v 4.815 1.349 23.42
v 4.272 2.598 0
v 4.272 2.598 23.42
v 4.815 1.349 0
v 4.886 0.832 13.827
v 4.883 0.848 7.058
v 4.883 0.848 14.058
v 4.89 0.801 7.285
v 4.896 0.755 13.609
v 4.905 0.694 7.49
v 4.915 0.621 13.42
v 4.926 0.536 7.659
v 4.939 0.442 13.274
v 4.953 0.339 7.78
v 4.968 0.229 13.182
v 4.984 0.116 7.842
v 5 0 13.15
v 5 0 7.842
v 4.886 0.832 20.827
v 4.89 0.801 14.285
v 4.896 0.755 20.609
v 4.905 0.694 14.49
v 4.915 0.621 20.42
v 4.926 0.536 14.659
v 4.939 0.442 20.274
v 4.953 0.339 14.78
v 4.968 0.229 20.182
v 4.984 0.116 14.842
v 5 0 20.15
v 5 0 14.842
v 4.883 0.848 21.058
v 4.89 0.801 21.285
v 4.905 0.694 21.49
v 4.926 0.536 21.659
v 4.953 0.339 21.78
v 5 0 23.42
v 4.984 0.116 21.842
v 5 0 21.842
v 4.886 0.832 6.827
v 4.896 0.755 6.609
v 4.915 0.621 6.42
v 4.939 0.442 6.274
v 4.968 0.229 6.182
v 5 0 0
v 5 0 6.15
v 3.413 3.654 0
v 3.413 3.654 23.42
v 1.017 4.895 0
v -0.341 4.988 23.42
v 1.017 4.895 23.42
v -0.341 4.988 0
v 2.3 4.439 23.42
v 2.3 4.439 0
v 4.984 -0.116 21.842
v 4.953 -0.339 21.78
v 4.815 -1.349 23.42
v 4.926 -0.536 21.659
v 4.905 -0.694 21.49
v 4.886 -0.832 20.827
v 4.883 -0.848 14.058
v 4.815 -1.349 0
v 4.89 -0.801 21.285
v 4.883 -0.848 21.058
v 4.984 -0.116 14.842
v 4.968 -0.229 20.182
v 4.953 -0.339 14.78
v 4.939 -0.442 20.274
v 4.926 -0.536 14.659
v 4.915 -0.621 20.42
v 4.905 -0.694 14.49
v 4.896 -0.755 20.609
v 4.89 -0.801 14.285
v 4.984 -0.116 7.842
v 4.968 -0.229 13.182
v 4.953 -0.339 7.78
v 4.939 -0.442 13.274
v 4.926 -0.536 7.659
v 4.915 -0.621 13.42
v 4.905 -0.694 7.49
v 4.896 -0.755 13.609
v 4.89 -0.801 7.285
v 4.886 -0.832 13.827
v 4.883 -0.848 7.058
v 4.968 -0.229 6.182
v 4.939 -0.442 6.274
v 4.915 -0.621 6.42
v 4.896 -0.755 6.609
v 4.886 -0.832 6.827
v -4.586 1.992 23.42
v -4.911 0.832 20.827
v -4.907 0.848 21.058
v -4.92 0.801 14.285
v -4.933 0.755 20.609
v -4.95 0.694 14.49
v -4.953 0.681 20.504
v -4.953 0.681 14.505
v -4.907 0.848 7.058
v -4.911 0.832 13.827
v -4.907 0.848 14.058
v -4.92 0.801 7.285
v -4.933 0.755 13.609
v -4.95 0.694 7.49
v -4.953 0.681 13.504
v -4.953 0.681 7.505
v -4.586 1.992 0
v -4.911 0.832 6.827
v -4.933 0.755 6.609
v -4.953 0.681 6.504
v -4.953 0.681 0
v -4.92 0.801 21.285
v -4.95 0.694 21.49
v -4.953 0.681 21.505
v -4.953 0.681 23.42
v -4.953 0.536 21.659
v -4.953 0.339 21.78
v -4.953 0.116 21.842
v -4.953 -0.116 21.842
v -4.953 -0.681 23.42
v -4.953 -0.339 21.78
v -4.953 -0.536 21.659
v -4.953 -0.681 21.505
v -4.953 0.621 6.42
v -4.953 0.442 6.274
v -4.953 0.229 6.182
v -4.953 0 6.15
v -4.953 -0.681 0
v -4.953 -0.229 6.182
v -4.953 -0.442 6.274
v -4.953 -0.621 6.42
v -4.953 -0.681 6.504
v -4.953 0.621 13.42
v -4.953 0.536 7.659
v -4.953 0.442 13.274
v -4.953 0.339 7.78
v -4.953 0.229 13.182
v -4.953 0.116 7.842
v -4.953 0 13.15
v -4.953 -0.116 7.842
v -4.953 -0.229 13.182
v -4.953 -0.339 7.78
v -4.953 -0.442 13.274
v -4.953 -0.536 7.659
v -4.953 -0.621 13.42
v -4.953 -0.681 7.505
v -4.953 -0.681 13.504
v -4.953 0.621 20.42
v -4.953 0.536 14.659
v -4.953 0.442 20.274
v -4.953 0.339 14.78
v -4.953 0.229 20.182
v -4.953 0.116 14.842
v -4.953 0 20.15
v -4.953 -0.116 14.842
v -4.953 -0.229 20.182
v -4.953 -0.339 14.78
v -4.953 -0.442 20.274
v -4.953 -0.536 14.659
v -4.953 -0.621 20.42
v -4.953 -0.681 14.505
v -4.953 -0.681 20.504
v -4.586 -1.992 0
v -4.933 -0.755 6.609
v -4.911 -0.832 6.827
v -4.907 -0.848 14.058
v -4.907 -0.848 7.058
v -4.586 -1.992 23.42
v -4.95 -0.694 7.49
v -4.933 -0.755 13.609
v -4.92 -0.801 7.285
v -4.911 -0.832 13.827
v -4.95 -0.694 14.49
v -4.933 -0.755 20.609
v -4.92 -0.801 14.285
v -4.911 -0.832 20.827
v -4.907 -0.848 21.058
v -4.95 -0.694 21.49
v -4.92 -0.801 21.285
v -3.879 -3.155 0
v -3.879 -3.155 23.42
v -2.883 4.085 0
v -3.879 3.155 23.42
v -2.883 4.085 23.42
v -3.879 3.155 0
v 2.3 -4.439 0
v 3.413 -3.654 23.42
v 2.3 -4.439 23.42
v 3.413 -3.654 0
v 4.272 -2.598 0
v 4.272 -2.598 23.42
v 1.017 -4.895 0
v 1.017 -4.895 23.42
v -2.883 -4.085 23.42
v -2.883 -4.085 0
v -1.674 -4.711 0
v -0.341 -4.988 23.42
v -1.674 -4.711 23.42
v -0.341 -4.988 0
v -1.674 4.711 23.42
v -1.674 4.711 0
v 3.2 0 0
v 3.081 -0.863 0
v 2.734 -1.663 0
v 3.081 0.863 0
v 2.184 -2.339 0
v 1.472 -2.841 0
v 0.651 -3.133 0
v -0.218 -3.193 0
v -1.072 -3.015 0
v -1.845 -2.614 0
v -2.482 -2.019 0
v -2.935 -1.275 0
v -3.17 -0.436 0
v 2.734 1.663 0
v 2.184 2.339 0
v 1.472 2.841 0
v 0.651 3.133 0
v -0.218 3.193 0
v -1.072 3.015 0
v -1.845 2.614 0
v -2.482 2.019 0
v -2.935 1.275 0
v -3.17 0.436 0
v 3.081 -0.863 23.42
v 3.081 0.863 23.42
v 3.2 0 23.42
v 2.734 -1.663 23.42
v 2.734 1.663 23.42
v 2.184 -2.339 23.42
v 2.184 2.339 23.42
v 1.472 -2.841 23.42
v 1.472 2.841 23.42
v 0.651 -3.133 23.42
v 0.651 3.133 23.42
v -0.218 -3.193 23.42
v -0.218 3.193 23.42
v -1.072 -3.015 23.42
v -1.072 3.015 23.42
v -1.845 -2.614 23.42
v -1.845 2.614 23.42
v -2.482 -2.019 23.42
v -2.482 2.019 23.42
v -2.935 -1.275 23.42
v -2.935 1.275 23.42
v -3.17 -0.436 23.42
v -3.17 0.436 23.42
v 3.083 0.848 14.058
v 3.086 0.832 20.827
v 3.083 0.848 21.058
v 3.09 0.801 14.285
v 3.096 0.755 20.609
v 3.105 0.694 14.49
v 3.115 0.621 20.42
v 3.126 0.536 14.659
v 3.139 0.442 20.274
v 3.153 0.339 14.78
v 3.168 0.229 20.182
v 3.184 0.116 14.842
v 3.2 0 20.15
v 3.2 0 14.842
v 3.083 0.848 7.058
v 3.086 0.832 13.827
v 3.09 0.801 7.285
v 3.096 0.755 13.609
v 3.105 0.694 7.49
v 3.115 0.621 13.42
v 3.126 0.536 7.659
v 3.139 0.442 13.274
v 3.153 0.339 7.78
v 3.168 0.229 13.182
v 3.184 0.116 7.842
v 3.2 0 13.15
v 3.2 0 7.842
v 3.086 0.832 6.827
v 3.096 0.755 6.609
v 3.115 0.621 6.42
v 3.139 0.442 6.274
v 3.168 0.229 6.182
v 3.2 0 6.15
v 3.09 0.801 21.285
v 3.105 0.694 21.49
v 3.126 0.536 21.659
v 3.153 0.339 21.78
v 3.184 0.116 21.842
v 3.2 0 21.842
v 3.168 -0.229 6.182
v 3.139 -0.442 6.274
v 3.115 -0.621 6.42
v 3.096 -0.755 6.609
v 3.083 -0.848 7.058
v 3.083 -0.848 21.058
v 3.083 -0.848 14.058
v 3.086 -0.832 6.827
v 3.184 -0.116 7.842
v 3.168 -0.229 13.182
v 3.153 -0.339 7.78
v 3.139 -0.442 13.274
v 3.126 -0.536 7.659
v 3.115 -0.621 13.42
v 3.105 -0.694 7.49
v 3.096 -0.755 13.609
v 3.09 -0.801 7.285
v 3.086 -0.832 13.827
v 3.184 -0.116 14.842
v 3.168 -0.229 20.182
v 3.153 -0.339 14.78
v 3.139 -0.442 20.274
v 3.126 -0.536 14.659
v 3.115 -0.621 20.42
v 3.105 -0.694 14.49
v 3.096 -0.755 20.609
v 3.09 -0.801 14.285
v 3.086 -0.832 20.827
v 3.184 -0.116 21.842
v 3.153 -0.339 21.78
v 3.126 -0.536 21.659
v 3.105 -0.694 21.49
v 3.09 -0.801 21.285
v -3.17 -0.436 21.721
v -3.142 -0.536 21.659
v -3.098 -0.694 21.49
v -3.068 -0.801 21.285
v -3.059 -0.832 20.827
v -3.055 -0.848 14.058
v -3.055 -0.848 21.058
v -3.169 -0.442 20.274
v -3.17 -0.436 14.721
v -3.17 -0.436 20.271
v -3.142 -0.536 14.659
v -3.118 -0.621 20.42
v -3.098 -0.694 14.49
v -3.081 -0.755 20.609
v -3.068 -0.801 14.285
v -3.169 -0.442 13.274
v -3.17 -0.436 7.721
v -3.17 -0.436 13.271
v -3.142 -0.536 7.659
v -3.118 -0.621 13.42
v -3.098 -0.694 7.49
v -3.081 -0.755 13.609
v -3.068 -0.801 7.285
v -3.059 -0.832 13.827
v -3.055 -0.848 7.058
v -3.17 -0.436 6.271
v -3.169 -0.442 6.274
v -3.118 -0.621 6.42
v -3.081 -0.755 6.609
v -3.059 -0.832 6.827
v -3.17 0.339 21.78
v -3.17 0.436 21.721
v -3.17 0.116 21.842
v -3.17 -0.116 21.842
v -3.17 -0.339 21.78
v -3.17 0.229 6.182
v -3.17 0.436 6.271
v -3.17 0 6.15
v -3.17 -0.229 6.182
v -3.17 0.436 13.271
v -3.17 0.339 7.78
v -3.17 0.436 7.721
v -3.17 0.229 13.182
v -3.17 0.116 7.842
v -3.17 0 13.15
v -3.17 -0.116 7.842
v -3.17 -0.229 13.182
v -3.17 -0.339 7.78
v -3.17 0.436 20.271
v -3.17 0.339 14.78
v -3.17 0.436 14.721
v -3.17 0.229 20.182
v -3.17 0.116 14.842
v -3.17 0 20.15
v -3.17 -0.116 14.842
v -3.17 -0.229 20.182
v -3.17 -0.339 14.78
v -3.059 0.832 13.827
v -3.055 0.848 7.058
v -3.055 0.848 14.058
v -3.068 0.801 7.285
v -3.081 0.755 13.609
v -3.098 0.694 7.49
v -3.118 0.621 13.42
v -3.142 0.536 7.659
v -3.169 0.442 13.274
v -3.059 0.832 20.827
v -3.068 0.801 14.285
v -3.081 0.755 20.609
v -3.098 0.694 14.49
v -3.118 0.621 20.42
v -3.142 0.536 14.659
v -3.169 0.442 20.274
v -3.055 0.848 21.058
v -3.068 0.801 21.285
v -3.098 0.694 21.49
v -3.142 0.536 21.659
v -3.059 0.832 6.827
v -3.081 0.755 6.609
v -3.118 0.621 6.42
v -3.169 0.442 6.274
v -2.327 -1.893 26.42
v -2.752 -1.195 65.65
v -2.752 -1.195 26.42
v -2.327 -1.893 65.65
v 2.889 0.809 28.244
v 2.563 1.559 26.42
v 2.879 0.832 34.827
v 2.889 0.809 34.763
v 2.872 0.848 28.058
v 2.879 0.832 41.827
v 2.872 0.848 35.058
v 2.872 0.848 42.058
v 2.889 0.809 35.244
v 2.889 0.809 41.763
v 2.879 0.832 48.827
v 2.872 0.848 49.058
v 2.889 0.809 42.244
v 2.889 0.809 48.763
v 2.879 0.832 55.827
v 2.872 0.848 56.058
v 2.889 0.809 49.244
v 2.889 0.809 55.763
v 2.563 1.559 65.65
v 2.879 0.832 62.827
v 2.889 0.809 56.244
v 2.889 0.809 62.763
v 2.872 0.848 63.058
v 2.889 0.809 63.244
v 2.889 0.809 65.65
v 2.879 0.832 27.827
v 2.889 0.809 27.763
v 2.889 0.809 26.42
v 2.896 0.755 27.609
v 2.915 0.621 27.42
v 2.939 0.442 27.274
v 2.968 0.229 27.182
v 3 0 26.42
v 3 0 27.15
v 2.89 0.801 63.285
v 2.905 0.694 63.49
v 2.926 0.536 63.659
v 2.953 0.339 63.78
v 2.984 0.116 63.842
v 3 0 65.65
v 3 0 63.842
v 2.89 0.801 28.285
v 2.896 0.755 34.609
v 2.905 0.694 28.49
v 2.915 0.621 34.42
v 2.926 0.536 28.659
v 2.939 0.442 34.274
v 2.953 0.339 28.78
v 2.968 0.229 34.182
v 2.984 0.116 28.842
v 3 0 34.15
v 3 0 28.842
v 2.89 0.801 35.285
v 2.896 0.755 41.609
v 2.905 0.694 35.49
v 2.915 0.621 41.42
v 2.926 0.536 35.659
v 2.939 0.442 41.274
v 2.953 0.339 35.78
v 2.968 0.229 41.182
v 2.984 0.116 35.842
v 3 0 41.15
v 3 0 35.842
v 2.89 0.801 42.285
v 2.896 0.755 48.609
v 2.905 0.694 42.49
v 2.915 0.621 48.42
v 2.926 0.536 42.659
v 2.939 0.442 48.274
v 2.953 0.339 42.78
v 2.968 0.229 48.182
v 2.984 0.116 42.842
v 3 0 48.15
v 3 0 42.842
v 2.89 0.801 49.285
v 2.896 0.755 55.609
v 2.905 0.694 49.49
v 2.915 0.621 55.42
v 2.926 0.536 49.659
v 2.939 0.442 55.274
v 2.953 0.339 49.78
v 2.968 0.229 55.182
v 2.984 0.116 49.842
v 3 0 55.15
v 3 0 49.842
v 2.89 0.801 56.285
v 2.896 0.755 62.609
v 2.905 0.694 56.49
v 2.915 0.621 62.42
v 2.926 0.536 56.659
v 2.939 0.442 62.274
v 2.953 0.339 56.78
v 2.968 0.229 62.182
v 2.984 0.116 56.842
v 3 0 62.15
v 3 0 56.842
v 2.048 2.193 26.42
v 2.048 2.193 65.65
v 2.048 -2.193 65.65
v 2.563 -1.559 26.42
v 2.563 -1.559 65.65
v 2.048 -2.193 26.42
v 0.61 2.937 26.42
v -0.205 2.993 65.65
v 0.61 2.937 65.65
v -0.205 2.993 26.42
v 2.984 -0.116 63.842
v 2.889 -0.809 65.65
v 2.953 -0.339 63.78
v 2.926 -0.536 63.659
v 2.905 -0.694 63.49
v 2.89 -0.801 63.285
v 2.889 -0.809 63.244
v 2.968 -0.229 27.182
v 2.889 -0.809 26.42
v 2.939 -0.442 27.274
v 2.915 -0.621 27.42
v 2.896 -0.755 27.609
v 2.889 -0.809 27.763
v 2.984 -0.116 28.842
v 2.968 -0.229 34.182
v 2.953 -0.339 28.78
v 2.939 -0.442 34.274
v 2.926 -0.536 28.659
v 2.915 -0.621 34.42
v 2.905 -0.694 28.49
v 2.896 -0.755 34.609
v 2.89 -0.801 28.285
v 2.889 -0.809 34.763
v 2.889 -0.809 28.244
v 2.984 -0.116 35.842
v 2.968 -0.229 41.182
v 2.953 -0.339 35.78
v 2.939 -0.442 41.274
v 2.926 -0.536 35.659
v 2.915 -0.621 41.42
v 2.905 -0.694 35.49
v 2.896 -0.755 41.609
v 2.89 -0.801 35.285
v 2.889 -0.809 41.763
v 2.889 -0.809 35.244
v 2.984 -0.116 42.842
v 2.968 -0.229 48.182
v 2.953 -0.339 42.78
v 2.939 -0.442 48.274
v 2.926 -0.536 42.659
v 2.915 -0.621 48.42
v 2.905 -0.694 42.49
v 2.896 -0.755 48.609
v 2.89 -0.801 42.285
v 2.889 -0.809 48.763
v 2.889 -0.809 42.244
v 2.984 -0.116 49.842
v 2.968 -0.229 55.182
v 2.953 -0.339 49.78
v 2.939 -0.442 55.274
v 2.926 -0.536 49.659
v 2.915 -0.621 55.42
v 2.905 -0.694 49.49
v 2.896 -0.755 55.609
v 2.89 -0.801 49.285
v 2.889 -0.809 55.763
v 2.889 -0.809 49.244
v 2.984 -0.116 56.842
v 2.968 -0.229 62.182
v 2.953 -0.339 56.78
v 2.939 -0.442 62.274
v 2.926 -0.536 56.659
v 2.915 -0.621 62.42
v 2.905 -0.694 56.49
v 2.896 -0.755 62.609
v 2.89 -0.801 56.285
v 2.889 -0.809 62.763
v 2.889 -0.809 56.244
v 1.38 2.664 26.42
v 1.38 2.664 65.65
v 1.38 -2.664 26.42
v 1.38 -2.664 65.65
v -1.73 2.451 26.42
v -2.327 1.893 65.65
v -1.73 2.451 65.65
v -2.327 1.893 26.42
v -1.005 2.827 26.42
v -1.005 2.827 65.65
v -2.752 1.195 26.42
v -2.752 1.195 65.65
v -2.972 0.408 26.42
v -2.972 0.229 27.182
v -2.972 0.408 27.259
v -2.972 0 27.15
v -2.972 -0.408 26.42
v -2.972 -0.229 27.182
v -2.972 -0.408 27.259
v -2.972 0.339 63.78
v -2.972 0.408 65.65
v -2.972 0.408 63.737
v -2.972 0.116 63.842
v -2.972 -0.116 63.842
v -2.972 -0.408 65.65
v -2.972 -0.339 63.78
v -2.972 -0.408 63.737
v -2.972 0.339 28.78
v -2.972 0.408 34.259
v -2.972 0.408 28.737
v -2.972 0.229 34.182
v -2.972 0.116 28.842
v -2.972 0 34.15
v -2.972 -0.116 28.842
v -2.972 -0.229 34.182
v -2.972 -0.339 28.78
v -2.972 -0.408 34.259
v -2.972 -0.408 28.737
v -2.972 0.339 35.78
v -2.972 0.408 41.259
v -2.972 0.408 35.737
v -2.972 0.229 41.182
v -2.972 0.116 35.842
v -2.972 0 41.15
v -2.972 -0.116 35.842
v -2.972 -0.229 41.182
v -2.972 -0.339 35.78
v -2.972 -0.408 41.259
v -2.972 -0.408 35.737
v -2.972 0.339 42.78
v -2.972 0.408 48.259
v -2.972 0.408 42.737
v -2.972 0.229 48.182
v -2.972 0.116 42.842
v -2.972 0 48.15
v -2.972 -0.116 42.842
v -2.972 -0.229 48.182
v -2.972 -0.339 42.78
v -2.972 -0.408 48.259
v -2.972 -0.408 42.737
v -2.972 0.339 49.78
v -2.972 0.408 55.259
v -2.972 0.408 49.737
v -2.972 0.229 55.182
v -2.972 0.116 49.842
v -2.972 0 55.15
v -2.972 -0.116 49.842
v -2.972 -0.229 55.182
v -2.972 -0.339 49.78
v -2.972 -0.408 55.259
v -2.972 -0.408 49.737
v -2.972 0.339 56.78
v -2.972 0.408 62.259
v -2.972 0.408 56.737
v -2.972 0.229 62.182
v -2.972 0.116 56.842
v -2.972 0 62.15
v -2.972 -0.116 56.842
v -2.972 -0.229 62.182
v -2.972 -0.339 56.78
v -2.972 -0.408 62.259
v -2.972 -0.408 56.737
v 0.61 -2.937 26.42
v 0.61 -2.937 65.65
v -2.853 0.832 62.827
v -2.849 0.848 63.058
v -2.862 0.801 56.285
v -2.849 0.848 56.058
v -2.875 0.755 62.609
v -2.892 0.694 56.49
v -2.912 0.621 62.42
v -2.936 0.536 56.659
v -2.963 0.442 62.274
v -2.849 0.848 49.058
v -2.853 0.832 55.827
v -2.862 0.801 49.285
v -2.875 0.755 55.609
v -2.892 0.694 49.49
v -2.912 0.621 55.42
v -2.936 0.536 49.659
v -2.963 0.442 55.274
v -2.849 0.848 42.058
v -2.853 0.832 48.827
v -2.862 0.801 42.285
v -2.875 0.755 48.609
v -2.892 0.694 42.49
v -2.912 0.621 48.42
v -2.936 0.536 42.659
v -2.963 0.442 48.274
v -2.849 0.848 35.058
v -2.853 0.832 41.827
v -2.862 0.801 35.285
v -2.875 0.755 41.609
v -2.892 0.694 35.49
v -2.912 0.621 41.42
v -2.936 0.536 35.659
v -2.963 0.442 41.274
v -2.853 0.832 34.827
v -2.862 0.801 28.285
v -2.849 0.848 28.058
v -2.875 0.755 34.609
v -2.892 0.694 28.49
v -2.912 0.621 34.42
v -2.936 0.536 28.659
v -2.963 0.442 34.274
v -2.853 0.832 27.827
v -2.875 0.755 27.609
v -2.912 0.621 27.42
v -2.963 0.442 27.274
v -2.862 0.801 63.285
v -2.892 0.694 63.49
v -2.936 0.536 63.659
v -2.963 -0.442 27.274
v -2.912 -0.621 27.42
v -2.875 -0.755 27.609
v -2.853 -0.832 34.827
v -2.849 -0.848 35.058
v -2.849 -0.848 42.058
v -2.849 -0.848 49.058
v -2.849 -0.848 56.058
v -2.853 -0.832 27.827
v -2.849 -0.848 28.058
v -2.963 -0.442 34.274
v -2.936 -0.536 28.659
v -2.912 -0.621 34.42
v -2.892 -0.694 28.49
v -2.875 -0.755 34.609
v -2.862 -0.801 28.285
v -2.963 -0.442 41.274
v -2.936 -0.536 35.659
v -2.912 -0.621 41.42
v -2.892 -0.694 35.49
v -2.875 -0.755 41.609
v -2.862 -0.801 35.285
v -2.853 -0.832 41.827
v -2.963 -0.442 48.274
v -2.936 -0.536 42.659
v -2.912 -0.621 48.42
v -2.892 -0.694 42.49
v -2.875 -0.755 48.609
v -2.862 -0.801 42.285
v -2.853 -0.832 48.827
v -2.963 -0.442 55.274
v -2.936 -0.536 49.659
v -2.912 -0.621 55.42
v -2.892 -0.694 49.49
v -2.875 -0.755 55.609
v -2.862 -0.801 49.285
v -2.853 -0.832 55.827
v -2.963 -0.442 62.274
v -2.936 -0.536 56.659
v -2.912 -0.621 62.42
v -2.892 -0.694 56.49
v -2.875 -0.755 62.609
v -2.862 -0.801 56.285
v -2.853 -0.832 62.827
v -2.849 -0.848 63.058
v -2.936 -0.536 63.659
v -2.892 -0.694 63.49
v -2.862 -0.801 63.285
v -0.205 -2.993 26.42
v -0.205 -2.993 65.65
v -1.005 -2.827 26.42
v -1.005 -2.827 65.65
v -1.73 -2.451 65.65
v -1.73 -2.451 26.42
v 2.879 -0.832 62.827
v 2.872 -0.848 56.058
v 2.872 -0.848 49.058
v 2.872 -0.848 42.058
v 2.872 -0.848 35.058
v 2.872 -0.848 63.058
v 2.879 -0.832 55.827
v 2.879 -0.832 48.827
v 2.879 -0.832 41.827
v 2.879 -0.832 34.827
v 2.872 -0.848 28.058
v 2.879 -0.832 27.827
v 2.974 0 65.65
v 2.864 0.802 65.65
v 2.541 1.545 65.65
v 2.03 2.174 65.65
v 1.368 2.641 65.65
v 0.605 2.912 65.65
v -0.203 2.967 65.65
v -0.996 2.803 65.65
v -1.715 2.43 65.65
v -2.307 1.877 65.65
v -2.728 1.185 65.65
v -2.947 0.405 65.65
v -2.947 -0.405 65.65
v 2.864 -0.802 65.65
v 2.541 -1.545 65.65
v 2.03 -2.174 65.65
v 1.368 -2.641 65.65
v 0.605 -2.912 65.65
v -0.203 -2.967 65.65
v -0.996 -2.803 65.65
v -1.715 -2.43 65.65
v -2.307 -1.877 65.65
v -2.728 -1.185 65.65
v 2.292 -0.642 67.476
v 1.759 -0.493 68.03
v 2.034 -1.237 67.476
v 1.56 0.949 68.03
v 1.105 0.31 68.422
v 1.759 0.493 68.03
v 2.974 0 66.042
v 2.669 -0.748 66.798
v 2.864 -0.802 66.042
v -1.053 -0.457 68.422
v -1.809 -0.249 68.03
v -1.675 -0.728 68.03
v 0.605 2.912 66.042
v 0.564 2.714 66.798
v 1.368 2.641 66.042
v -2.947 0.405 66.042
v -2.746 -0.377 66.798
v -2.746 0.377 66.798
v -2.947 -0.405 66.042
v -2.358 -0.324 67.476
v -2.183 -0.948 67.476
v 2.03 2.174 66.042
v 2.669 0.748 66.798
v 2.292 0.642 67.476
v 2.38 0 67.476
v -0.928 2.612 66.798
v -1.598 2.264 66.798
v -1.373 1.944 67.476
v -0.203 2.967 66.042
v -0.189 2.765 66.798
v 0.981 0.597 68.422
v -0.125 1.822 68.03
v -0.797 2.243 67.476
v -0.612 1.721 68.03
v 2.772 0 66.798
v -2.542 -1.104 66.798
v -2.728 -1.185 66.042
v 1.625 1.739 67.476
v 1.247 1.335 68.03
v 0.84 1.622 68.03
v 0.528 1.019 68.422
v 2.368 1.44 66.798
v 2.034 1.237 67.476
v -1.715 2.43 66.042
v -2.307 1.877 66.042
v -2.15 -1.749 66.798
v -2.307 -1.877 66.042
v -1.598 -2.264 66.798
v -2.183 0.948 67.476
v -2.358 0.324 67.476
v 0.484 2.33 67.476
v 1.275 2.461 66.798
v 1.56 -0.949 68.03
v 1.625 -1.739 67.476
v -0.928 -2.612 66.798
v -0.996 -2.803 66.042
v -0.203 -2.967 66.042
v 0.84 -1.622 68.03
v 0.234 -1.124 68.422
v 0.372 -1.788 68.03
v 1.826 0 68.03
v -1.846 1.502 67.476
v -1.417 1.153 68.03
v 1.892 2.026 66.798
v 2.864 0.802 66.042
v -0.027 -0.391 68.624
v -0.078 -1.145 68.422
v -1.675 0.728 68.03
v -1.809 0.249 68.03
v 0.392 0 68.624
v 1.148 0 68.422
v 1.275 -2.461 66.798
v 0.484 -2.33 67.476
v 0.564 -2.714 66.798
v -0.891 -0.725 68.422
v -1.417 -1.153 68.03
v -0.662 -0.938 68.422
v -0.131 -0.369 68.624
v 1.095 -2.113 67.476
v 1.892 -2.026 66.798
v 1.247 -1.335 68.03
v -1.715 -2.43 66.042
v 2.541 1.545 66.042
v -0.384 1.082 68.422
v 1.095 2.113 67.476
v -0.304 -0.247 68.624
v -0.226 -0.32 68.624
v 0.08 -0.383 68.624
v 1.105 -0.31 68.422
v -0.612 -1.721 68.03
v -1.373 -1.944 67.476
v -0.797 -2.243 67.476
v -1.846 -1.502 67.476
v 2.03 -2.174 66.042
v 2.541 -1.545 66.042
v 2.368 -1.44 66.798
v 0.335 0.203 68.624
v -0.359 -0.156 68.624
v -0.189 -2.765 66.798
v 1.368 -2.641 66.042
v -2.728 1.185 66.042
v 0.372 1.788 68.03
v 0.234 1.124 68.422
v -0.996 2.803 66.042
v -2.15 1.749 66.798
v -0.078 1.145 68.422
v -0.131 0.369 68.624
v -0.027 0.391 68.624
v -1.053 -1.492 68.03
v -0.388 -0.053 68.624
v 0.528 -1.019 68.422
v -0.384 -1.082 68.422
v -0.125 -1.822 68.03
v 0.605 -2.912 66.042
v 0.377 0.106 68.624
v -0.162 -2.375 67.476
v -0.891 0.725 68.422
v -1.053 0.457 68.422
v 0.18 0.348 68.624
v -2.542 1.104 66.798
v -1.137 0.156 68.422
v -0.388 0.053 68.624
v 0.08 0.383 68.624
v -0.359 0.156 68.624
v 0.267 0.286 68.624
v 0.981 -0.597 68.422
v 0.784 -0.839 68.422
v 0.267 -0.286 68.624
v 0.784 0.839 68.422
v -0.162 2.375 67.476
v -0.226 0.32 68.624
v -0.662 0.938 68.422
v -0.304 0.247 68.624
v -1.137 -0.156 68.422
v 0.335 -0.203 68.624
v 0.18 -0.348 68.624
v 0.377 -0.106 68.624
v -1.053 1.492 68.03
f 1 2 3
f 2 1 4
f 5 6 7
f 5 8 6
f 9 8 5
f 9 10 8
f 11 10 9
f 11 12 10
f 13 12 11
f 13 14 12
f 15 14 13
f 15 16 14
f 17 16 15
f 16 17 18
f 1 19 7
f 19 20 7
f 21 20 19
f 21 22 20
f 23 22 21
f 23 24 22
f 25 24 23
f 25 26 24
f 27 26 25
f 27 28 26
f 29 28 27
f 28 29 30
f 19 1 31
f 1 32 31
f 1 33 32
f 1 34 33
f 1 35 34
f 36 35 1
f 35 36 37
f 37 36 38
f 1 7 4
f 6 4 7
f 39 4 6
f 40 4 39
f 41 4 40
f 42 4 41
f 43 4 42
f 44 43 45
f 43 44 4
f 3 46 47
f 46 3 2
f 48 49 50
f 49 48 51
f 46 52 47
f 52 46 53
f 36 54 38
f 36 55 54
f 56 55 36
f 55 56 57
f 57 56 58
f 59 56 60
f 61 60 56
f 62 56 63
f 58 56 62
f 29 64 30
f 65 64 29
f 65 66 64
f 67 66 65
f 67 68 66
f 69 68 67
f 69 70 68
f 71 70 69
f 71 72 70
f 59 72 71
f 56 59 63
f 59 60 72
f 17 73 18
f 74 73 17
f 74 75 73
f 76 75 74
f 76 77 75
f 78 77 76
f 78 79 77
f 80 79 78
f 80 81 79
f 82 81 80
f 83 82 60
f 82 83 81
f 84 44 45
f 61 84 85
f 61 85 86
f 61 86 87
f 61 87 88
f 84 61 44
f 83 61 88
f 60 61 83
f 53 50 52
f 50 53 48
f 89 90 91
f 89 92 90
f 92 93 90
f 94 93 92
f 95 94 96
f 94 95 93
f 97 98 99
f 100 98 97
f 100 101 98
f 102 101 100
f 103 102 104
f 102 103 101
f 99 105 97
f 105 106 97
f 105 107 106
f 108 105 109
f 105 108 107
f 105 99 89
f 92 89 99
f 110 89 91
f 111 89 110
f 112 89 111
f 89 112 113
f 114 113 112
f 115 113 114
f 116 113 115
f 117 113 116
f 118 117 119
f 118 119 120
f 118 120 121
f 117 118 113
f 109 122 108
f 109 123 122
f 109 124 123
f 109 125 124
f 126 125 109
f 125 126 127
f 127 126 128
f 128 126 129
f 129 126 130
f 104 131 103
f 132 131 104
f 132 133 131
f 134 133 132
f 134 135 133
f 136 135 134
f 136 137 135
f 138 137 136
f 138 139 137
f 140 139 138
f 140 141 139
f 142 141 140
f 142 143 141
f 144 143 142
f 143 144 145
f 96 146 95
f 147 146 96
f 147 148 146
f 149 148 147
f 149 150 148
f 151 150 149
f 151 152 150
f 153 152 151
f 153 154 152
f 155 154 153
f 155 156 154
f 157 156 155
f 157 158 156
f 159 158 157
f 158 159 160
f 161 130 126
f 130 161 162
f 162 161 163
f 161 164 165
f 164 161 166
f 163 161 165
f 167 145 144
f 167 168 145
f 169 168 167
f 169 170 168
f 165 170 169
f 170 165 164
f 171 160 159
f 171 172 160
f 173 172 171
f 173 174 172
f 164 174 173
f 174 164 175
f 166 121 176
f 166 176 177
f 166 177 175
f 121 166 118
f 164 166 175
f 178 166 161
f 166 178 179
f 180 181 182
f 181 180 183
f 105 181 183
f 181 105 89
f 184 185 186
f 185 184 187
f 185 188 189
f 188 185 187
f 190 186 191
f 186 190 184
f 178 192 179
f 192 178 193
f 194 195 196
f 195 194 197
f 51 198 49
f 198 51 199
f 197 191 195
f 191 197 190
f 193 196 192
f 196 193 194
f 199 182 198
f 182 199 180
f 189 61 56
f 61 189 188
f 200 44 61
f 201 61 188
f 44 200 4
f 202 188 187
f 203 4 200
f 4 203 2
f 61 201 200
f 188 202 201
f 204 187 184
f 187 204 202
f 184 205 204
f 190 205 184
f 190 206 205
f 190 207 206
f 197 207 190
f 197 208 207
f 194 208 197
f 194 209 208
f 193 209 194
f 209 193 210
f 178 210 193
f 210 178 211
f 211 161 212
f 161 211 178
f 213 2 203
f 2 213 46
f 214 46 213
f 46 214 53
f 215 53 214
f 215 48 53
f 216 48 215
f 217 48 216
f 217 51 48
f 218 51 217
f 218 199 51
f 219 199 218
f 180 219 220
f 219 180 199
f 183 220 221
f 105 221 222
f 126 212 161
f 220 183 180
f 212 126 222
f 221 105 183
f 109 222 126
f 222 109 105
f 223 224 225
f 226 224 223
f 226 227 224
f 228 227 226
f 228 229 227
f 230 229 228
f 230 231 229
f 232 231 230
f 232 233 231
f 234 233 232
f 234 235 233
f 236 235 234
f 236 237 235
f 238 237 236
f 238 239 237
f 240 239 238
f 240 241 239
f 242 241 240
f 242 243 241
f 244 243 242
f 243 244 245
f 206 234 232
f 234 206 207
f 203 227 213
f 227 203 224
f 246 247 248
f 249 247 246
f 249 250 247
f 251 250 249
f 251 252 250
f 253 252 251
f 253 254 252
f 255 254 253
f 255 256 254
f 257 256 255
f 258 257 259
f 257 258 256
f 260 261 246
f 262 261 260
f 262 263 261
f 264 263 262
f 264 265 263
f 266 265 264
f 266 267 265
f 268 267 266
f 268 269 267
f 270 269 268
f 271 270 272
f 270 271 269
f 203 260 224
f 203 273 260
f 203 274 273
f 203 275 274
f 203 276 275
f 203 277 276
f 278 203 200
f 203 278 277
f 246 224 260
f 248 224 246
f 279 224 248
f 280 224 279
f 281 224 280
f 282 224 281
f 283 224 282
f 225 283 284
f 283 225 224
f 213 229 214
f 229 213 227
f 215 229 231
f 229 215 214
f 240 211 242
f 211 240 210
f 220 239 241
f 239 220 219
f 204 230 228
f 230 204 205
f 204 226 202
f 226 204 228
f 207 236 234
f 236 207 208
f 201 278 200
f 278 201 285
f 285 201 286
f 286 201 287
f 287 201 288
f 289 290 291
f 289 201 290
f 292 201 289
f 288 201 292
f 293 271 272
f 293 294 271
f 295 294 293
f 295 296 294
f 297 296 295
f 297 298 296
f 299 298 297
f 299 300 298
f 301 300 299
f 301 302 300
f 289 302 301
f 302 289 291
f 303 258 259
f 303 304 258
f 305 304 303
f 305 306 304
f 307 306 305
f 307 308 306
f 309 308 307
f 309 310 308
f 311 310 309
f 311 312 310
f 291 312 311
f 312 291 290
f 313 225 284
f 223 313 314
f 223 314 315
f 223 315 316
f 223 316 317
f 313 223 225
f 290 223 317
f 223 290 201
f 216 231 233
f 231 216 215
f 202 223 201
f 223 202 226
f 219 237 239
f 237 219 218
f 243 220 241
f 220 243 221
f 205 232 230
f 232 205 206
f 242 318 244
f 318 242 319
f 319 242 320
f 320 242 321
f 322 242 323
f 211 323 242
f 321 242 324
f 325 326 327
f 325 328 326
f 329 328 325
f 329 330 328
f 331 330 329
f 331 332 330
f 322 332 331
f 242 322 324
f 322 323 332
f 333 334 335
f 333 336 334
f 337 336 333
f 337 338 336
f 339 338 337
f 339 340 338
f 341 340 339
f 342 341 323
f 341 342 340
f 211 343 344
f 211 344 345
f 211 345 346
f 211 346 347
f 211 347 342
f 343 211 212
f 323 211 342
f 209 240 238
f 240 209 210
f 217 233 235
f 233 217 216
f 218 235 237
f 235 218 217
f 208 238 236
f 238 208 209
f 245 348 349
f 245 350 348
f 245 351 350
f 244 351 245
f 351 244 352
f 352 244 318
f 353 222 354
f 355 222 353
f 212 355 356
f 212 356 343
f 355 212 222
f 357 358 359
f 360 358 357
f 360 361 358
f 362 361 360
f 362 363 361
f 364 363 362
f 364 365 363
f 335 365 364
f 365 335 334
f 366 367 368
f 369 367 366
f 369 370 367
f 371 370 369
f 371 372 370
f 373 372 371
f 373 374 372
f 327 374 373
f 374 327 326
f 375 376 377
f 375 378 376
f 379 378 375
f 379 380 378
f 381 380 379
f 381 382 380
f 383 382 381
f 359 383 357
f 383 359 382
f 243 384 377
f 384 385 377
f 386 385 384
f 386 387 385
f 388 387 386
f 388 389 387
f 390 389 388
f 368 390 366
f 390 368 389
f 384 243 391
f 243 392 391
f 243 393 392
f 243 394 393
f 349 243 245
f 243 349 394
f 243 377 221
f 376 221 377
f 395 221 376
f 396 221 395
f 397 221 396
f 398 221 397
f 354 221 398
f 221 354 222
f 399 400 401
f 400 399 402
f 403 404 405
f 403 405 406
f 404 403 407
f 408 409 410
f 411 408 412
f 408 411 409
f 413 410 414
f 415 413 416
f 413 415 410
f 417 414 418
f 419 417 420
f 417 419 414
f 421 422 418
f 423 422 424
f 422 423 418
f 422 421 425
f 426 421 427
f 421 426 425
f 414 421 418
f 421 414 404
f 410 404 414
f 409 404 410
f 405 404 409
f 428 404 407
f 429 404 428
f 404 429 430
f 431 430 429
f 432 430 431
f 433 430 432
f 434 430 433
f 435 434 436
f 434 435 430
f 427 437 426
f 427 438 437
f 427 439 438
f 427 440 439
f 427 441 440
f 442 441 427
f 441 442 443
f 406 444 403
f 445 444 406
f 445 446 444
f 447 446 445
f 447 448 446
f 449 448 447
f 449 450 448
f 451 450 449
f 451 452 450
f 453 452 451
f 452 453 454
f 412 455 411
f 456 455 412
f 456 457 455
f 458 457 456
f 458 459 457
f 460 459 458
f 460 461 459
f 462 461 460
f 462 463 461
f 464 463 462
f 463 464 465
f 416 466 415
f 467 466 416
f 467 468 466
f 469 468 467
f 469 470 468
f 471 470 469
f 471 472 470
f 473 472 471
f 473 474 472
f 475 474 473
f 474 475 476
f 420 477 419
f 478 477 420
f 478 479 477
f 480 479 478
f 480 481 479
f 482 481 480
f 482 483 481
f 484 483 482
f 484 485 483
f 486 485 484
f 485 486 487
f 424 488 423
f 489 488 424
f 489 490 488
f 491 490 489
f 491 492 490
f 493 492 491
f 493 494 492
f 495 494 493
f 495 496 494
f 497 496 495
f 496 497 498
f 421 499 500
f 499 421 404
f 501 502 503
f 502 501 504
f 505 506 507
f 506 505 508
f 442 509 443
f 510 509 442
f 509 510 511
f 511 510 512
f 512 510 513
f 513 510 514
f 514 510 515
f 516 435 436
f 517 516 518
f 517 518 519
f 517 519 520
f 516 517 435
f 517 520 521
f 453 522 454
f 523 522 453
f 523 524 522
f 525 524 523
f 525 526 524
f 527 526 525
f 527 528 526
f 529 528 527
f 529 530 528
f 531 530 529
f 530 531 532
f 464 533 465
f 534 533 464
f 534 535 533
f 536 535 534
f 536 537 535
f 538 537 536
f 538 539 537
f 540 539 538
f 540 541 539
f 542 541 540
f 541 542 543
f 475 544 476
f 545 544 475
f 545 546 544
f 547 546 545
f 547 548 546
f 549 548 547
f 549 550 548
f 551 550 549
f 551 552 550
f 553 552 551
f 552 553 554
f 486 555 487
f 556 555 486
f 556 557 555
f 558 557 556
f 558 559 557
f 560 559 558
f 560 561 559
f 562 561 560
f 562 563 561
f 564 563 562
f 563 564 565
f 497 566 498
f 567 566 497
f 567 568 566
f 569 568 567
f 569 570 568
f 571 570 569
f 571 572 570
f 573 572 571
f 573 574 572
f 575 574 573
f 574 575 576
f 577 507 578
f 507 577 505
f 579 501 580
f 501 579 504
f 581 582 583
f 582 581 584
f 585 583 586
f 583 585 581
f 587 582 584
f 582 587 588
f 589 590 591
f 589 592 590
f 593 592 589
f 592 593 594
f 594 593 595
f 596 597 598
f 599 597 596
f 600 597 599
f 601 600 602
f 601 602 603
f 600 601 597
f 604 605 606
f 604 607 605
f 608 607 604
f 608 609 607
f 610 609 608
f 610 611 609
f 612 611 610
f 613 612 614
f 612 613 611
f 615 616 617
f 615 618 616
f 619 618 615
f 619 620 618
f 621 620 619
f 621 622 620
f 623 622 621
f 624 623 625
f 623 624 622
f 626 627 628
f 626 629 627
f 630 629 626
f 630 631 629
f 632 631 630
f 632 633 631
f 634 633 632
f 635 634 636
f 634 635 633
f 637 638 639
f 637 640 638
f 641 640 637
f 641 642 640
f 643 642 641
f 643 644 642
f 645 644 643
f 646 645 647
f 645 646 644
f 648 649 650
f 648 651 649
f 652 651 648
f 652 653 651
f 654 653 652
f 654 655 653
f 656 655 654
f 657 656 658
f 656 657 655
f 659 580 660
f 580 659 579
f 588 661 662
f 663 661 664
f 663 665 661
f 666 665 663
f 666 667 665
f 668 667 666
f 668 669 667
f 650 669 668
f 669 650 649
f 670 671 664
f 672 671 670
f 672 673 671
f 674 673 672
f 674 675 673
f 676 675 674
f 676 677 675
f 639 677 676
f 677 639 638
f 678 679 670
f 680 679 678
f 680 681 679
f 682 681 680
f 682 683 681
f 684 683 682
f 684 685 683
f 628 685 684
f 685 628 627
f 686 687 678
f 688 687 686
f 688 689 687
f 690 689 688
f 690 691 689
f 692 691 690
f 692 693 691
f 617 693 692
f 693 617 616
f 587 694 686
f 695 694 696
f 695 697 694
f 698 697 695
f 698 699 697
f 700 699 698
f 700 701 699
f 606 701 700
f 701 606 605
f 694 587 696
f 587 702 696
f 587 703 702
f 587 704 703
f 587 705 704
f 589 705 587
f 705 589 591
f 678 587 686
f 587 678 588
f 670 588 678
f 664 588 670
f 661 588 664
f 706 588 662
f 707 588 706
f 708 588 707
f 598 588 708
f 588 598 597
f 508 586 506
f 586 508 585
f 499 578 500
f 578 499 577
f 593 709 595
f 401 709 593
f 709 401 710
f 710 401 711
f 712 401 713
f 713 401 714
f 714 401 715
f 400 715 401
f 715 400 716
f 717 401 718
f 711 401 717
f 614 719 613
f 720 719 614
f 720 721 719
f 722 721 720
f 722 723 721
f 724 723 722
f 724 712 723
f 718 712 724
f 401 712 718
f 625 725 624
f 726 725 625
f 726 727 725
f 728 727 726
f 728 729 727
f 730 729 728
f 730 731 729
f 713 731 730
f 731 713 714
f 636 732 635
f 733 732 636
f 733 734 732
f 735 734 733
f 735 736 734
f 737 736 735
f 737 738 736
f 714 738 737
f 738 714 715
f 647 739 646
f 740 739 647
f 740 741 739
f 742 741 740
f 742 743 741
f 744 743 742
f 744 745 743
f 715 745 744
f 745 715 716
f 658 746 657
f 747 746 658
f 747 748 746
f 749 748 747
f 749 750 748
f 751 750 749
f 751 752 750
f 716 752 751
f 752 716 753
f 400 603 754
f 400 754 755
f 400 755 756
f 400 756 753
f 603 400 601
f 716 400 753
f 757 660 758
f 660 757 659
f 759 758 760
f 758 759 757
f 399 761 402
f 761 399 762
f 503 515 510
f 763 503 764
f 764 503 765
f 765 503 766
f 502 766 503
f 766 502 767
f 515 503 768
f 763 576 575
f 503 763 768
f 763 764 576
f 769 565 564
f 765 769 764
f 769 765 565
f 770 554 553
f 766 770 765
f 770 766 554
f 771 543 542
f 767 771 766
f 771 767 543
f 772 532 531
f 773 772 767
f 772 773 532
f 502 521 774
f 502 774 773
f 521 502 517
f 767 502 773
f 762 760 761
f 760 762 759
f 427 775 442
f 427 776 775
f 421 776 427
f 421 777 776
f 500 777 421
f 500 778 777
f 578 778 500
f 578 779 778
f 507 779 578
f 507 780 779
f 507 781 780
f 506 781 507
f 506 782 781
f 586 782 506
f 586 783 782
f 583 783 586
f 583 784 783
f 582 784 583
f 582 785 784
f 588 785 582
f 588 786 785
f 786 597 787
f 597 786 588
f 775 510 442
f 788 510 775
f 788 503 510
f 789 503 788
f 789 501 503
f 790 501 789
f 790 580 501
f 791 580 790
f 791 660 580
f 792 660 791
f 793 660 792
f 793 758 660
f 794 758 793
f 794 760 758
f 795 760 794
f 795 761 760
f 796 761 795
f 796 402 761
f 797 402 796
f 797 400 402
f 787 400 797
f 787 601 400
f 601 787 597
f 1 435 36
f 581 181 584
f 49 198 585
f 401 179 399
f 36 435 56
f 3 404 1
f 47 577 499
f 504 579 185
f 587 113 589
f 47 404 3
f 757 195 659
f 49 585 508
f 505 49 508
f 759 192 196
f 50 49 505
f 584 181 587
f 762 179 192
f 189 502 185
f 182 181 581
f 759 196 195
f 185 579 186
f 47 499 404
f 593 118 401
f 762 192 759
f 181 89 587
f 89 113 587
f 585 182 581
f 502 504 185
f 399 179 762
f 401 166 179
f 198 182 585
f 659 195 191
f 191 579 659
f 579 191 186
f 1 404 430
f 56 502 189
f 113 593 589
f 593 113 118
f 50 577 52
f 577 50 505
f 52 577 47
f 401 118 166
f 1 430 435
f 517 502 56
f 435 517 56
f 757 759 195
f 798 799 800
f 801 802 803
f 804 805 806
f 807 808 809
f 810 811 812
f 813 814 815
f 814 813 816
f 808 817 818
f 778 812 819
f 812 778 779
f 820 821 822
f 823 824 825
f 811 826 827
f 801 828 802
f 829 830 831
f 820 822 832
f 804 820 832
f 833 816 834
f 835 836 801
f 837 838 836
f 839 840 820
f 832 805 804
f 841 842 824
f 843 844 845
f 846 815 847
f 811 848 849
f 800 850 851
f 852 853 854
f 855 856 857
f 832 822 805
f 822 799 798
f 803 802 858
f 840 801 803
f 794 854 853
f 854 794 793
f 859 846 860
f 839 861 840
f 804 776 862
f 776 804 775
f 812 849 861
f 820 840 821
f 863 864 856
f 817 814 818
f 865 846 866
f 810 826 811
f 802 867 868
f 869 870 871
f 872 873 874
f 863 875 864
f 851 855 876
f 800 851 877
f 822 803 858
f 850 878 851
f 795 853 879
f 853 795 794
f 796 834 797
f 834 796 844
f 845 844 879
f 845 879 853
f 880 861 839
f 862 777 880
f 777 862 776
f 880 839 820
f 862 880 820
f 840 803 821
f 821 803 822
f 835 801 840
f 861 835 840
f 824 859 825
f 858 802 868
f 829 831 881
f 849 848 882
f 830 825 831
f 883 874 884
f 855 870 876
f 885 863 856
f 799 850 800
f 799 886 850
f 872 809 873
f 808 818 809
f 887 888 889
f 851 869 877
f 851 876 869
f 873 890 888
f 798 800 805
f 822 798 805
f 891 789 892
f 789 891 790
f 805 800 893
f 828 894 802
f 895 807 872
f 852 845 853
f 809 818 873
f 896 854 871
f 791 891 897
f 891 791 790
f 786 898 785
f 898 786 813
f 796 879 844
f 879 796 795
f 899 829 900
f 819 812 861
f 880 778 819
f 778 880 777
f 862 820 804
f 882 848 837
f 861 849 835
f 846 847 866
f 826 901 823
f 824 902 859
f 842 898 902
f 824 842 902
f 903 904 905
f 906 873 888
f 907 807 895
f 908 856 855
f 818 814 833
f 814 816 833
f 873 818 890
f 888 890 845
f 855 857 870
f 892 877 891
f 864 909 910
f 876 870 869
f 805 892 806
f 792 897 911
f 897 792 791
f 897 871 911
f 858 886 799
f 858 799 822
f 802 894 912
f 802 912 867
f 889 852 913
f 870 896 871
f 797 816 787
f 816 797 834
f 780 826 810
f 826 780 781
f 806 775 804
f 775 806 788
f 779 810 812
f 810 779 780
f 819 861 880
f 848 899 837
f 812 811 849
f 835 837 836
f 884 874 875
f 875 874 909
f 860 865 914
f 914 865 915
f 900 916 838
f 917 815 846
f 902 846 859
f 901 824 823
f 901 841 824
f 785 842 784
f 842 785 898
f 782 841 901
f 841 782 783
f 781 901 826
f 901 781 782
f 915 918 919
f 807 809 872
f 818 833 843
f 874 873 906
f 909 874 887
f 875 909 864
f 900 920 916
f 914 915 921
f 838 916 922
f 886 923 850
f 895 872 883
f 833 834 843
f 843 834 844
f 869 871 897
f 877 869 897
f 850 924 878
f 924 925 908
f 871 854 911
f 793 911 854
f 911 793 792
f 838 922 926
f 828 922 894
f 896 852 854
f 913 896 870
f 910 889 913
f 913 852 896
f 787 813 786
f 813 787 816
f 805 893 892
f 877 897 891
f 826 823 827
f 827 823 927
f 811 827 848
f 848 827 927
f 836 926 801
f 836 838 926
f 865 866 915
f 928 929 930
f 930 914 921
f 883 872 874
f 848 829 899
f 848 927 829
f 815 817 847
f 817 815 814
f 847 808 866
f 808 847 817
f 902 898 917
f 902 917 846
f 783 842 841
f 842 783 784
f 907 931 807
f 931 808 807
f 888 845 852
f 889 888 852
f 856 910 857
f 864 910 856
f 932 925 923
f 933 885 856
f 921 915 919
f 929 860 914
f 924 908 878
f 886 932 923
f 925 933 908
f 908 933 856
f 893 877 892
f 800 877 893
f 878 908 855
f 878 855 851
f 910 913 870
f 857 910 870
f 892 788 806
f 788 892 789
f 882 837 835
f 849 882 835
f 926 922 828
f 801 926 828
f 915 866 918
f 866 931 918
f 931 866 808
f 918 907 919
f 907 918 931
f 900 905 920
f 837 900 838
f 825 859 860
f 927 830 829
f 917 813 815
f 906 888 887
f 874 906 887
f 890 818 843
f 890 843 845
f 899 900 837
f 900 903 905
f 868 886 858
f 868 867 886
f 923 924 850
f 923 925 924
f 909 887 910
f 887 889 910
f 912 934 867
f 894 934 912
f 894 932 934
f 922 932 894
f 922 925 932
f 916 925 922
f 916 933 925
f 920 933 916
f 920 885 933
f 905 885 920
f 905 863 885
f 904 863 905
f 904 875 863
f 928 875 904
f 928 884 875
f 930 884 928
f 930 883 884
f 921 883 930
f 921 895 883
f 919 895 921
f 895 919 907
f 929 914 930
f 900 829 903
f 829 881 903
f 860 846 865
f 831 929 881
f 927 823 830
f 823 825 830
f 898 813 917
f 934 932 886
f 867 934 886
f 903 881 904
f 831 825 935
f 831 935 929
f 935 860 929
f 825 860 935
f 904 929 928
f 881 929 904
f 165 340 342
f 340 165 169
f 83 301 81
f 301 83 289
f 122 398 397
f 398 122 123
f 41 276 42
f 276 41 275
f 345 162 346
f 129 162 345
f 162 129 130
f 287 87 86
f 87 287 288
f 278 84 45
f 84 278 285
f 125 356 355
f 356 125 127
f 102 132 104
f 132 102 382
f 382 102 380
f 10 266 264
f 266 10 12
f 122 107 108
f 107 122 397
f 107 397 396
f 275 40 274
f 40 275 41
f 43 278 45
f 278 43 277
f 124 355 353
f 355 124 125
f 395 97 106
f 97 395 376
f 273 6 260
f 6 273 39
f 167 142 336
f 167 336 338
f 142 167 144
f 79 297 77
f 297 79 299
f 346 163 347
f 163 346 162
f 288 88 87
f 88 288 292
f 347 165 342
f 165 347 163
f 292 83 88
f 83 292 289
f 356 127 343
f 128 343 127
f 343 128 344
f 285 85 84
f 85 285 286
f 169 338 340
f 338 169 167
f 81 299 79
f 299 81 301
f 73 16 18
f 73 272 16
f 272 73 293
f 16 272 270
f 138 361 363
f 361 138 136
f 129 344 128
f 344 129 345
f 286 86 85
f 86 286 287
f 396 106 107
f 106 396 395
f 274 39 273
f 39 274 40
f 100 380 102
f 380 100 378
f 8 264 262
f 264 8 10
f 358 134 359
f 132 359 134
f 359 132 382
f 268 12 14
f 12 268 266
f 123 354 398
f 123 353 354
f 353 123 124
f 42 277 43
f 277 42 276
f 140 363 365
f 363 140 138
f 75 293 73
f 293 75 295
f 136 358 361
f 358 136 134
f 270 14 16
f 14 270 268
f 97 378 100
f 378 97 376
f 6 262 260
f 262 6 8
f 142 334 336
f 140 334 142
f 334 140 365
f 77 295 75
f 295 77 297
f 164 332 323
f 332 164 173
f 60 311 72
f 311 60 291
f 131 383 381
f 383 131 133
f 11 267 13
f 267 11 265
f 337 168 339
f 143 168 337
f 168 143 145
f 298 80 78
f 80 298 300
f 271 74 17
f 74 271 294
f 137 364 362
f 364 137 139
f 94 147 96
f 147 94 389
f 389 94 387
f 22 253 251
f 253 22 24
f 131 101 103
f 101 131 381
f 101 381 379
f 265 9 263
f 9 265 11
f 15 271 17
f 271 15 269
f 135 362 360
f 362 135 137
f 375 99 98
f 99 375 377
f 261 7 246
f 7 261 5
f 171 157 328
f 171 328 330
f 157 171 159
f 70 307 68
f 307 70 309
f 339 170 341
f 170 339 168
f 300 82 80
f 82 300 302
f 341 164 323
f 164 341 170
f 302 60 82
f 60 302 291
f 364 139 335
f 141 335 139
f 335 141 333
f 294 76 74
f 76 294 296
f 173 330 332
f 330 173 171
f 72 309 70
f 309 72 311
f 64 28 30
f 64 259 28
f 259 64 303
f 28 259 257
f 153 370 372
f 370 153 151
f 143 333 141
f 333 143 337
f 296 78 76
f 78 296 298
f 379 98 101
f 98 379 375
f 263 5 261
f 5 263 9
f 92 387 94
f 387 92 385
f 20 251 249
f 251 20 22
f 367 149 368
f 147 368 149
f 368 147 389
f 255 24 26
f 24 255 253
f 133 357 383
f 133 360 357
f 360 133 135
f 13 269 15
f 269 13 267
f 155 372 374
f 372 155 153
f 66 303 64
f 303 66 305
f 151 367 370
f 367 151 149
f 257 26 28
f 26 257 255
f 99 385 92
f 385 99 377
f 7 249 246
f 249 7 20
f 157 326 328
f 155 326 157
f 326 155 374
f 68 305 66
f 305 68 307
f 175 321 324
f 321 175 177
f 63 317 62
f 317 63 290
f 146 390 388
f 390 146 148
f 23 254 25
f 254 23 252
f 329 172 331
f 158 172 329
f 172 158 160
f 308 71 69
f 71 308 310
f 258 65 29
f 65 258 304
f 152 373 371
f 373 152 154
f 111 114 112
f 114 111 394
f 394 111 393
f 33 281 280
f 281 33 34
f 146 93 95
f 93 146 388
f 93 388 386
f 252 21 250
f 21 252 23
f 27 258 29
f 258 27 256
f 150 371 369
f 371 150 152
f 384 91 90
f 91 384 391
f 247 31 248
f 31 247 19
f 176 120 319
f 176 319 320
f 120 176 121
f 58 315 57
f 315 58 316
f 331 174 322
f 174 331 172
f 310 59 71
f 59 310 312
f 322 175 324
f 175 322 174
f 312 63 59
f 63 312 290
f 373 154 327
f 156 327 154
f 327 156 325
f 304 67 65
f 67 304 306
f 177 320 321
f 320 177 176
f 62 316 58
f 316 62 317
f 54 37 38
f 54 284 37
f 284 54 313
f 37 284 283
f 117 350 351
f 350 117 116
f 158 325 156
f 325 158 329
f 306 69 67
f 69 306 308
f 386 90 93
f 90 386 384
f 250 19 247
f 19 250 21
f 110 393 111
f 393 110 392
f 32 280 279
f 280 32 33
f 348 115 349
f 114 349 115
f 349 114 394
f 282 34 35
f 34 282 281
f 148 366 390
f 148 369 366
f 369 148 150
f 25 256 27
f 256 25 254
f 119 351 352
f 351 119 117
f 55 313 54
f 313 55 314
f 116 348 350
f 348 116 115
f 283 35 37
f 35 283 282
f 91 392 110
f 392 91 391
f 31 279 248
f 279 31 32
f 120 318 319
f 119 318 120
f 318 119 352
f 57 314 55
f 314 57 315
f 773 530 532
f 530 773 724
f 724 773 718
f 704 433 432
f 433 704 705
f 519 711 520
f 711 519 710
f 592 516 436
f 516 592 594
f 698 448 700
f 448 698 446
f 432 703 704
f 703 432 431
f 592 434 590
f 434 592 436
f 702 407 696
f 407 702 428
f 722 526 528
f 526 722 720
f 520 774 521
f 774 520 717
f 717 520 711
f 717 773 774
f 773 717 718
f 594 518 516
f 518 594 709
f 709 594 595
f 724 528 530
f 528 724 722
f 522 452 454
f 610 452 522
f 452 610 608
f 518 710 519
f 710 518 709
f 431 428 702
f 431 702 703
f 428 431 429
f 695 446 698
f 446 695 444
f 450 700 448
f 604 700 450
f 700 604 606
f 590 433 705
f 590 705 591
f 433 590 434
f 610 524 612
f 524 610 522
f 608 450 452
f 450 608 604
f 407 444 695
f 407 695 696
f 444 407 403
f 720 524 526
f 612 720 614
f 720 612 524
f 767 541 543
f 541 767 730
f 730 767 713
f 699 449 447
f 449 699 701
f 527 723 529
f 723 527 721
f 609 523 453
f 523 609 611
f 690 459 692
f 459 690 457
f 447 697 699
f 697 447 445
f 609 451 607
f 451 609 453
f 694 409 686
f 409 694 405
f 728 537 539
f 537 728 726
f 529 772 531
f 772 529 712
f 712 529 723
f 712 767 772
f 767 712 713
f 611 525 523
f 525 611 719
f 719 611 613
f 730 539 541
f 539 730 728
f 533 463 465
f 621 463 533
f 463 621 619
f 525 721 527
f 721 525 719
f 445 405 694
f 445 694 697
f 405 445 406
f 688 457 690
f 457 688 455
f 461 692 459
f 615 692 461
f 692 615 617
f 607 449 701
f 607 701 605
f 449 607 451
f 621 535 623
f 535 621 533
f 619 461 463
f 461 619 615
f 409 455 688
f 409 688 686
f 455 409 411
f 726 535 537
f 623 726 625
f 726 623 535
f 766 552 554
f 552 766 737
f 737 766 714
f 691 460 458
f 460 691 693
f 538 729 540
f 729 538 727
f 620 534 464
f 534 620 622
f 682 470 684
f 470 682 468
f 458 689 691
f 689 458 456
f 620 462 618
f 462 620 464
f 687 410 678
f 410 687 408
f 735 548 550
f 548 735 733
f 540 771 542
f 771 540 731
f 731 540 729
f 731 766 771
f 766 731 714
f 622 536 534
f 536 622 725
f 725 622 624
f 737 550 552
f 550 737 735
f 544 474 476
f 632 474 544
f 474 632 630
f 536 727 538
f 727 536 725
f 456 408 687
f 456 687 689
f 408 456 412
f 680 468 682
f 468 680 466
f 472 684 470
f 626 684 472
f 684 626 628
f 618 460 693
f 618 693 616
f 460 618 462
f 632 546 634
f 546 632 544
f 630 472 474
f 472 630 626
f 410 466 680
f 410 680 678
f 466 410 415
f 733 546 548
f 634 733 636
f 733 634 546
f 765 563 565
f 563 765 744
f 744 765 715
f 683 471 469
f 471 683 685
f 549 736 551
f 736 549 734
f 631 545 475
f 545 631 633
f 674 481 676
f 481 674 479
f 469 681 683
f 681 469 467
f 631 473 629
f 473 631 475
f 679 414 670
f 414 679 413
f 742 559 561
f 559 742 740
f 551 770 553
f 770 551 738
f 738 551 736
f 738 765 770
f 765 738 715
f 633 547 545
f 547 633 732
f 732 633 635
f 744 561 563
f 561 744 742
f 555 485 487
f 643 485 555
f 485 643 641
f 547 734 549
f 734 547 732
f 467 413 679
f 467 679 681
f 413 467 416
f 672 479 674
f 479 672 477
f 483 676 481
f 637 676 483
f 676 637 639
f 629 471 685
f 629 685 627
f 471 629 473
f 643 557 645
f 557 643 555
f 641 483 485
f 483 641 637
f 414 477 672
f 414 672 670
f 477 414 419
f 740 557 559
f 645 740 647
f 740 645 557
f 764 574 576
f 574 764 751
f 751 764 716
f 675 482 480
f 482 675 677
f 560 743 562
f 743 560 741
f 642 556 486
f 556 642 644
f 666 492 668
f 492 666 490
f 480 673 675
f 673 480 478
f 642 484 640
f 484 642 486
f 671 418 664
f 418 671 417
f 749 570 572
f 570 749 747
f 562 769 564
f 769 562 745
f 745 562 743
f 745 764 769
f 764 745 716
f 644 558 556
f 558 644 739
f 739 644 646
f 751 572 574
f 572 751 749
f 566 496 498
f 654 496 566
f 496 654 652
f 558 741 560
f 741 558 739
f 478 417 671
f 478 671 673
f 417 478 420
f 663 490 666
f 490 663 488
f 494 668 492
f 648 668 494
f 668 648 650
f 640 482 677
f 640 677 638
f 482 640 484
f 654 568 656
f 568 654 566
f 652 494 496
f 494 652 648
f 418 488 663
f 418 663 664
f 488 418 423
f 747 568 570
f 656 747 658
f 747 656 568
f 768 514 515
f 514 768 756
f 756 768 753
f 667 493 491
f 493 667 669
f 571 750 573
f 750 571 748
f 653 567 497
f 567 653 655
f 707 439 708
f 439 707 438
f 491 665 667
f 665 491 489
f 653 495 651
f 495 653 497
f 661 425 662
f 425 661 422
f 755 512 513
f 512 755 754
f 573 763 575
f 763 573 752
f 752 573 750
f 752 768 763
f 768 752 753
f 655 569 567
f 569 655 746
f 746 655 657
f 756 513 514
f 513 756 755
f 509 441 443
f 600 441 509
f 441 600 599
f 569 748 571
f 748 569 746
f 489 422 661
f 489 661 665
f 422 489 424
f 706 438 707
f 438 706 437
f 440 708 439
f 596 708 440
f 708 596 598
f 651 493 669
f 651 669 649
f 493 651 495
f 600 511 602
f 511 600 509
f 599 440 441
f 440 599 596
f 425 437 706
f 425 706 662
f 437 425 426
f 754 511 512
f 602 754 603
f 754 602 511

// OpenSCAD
/*
	
	1/10 Scale Touring Car Body Post Extender

*/

$fn=23;
gPostDia=6.0;
gPostHeight=42.23;
//gPostHeight=23.42;
gConnectorDia=10.0;
gConnectorOverlap=23.42;
gSetscrewDia=1.7; //2.0, 1.4
gDingens=3.0;
gSpace=0.2+0.2;

difference()
{
	union()
	{
		/* Post */
		translate([0, 0, gConnectorOverlap+gDingens])
		cylinder(d=gPostDia, h=gPostHeight-gDingens);
		translate([0, 0, gConnectorOverlap])
		cylinder(d1=gConnectorDia, d2=gPostDia, h=gDingens);
		translate([0, 0, gConnectorOverlap+gPostHeight])
		sphere(d=gPostDia);
		
		
		difference()
		{
			/* Hull */
			cylinder(d=gConnectorDia, h=gConnectorOverlap);

			/* Room for lower post */
			cylinder(d=gPostDia+gSpace, h=gConnectorOverlap);
			
			/* Holes for pins, set screw, or whatever */
			if(0)
			for (sh=[5:7:21])
			translate([0, 0, sh])
			rotate([0, 90, 0])
			cylinder(d=gSetscrewDia, h=42, center=true);

		} // diff
	} // union

	/* Holes for pins, set screw, or whatever */
	if(1)
	for (sh=[7:7:gConnectorOverlap+gPostHeight])
	translate([0, 0, sh])
	rotate([0, 90, 0])
	cylinder(d=gSetscrewDia, h=42, center=true);
} // diff
